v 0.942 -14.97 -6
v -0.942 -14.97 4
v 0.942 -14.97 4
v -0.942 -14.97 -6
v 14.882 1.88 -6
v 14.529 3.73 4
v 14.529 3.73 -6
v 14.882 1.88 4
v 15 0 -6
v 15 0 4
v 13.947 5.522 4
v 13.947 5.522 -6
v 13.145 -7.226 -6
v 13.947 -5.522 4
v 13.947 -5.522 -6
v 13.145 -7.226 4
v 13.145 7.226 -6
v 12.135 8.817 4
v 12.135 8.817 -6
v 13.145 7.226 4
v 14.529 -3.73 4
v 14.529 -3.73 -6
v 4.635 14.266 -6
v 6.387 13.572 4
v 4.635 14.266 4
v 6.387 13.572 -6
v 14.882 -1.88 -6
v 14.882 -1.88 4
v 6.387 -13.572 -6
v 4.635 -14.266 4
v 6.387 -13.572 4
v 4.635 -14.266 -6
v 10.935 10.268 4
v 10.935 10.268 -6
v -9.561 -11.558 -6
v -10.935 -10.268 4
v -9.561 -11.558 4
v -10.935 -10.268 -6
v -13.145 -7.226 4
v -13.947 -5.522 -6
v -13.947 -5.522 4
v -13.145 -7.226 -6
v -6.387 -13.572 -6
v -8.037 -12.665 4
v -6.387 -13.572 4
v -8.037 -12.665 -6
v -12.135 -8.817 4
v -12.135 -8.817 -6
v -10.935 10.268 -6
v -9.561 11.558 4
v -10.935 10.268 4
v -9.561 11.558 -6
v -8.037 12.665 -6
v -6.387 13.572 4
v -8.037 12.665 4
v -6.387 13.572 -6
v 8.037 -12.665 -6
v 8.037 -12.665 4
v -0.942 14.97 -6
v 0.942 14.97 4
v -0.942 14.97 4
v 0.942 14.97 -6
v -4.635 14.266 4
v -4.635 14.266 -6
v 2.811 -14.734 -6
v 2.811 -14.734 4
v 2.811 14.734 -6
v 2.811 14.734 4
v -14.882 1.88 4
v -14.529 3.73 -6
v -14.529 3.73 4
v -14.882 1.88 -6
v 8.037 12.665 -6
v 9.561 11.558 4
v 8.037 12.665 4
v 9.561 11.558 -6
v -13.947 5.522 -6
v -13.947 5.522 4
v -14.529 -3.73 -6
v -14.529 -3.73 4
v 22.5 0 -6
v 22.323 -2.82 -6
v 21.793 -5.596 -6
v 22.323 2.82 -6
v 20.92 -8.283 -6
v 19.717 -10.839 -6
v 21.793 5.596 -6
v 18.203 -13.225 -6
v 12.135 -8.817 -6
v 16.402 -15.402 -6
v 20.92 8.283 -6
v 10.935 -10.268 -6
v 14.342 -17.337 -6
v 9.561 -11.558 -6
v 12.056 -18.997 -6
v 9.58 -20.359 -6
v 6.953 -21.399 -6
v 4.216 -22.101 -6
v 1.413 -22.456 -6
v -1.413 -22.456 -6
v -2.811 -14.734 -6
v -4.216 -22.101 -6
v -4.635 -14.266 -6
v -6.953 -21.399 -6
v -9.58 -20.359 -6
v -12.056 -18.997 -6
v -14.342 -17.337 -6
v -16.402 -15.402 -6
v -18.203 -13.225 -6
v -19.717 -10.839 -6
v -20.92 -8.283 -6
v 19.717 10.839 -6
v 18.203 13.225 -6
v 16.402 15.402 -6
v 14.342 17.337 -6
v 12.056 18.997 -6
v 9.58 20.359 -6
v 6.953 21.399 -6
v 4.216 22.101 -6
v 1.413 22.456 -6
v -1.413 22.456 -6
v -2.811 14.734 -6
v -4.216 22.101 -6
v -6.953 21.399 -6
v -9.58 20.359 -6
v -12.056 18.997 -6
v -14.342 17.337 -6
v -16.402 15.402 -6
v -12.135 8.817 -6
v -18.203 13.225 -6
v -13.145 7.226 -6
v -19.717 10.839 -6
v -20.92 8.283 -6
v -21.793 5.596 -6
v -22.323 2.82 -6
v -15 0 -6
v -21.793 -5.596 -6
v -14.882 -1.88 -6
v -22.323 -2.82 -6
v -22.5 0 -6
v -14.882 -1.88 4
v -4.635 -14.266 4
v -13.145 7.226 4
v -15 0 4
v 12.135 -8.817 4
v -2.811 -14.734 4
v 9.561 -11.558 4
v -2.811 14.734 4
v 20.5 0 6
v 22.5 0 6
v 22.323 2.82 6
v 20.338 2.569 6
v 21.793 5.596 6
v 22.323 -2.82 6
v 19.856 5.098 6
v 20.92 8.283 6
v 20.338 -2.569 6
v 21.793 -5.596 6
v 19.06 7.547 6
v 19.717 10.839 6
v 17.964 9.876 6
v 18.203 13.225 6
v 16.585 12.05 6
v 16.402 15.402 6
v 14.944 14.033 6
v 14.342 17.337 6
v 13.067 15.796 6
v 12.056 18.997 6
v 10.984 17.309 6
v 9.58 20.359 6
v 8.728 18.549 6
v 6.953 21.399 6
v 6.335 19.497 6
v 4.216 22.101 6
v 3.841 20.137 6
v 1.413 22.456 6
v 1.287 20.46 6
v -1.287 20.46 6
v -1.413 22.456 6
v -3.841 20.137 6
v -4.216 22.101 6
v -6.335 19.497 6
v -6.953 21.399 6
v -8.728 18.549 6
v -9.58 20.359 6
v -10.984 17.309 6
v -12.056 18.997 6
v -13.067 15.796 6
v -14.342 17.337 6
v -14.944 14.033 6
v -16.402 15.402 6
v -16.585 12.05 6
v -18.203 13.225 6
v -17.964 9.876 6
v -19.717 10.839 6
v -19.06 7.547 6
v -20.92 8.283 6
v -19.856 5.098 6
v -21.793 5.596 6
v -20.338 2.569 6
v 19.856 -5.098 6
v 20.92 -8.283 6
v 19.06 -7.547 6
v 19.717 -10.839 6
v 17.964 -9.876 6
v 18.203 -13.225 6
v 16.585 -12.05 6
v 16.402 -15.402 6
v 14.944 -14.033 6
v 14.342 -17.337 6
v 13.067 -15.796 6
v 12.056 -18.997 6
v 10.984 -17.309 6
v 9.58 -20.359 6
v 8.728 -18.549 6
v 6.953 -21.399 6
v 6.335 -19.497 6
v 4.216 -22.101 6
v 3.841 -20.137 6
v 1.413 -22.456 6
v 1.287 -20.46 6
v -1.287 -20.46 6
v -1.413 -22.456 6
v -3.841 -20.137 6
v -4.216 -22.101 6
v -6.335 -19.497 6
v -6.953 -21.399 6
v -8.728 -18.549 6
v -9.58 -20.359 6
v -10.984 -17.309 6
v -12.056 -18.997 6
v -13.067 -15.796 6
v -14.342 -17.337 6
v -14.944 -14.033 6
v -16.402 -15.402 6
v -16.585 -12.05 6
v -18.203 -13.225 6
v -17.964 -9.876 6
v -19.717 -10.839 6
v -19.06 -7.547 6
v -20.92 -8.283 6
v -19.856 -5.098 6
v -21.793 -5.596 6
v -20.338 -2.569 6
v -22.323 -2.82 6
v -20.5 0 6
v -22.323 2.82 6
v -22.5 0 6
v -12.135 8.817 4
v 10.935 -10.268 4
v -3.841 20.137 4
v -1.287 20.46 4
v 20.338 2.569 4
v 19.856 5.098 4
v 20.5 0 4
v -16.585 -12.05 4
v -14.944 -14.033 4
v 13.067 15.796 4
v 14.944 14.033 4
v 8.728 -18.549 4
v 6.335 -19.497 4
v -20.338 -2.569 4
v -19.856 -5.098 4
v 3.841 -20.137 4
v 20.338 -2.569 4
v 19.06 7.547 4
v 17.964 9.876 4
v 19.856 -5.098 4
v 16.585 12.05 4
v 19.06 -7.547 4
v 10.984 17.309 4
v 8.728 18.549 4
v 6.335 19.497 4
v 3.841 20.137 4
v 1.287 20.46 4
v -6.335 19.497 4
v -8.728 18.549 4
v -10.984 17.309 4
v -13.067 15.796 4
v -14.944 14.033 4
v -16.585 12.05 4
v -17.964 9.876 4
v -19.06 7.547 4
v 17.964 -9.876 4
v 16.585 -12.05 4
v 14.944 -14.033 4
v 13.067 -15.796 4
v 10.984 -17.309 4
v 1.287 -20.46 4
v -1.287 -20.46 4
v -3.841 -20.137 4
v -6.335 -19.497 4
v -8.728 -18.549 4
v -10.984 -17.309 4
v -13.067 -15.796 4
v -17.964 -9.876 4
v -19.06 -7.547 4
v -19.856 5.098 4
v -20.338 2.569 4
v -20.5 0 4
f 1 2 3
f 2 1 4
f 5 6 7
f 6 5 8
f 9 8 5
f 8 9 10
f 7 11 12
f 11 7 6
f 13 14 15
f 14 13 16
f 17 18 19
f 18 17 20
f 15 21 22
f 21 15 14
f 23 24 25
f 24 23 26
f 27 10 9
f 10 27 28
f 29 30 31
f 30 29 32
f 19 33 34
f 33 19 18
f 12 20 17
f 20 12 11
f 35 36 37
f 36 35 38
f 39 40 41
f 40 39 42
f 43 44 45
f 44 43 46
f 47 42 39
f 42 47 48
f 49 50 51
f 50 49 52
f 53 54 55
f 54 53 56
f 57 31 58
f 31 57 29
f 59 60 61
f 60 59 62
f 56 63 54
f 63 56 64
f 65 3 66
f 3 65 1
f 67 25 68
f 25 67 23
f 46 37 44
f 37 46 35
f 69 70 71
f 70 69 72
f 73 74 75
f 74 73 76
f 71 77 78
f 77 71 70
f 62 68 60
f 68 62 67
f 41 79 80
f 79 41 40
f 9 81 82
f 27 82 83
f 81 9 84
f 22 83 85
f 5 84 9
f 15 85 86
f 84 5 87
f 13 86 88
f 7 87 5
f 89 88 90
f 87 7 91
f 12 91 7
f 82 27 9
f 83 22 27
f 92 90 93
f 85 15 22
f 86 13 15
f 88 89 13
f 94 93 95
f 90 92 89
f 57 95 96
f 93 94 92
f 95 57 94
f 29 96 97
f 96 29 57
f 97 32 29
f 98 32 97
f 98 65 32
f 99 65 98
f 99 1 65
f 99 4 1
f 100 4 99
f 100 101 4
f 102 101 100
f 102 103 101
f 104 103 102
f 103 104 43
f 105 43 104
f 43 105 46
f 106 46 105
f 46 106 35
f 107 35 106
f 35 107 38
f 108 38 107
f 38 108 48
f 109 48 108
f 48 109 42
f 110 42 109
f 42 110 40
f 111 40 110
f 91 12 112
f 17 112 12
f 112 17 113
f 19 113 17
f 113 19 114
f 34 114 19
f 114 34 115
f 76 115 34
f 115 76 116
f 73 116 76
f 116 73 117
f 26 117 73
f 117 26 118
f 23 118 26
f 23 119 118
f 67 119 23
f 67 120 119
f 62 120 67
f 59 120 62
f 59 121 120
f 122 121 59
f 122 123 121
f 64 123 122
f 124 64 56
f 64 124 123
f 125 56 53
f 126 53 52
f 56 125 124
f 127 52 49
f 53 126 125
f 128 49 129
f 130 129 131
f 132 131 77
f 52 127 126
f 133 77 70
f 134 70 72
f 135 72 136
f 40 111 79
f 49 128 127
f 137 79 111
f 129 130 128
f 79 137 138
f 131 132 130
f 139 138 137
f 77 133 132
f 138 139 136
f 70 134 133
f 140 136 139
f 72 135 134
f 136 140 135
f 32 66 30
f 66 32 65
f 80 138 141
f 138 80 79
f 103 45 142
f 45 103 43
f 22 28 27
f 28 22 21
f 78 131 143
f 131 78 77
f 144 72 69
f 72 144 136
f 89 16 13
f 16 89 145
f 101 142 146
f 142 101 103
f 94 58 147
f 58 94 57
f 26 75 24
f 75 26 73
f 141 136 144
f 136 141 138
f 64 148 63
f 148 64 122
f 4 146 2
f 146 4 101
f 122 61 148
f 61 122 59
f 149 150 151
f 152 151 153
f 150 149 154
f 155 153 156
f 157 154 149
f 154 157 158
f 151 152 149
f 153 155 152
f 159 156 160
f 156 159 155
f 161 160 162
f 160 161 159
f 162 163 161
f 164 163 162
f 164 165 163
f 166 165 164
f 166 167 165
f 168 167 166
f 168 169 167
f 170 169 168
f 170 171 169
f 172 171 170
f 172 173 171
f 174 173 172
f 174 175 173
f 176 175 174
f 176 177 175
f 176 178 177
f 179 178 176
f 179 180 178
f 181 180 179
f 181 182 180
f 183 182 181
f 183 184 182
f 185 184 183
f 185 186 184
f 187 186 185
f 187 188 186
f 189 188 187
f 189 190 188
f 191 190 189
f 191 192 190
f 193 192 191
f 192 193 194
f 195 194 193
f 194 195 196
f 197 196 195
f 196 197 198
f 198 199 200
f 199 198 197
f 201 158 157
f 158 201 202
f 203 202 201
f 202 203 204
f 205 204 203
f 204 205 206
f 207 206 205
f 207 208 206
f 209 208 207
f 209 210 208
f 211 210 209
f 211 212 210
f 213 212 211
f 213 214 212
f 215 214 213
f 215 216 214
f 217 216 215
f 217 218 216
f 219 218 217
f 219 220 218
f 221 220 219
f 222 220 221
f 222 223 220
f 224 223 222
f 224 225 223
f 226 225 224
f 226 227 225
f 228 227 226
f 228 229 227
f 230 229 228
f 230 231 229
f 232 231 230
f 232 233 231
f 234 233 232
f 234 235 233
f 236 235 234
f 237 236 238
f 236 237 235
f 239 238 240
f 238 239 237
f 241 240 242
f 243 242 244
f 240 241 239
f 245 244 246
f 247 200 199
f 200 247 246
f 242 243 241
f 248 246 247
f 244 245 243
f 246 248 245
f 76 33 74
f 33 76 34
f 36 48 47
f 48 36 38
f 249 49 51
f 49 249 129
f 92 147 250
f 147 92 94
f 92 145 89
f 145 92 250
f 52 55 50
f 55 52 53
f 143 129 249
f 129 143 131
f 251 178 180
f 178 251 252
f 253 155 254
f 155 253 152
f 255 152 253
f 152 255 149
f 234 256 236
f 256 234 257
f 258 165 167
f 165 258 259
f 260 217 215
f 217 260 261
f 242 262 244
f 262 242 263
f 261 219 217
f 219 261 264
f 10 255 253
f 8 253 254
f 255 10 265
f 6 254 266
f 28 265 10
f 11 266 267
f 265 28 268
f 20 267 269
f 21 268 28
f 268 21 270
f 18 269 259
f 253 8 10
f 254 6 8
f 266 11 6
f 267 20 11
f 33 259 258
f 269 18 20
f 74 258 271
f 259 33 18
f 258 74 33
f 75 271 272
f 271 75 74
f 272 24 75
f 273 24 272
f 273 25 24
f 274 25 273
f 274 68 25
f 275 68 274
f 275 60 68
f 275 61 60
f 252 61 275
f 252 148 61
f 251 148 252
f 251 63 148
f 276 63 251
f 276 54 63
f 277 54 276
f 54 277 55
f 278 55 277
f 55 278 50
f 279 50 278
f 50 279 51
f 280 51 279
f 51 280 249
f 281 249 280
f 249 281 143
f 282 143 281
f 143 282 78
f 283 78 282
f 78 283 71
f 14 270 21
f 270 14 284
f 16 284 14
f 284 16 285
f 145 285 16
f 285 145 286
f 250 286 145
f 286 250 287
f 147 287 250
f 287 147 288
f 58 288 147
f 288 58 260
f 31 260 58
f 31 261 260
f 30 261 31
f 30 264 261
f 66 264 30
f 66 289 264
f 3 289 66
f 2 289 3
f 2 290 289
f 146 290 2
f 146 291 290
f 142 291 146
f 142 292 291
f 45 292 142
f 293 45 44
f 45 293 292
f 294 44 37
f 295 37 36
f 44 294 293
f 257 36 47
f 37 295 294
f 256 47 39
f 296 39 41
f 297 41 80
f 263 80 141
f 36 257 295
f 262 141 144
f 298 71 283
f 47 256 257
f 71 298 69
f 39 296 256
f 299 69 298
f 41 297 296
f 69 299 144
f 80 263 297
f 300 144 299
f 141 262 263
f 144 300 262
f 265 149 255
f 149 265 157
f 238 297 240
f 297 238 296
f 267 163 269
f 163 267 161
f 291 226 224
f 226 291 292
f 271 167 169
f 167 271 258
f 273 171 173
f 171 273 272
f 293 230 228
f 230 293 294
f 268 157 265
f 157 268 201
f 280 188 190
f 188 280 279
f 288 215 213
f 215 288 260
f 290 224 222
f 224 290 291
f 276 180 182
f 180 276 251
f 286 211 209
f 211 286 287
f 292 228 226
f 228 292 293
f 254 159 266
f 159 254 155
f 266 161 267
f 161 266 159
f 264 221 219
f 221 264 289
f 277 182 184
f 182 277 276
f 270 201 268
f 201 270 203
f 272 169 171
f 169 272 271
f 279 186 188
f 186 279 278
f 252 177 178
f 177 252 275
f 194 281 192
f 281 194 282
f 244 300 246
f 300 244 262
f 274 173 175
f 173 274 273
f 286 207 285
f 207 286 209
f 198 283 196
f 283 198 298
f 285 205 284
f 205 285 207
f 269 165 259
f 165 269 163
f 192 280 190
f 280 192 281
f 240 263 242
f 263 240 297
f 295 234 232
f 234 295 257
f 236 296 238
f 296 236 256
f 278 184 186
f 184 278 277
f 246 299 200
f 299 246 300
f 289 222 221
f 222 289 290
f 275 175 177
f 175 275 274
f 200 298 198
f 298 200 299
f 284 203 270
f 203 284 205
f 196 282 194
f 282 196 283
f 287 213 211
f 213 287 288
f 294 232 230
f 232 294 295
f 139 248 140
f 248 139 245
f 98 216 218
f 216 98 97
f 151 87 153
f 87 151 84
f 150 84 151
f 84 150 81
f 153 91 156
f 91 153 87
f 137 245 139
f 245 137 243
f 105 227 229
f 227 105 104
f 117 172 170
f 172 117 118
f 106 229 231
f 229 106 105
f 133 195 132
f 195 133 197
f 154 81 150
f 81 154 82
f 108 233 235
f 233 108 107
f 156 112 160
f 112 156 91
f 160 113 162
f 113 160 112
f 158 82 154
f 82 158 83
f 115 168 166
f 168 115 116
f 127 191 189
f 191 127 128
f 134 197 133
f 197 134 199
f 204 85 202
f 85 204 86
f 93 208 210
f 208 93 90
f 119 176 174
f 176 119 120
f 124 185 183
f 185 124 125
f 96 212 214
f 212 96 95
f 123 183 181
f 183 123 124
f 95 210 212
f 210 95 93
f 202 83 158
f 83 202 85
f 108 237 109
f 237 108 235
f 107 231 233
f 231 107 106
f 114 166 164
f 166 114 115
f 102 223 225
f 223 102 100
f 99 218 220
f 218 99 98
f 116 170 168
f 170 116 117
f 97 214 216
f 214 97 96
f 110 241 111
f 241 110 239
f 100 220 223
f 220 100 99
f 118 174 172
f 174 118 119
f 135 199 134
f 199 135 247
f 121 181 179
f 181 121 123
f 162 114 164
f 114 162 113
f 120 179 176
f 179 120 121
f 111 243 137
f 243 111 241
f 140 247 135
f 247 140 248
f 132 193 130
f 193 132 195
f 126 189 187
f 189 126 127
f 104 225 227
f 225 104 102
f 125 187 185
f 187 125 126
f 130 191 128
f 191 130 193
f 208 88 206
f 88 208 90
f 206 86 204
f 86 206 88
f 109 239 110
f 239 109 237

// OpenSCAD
$fn = 50;


difference() {
	union() {
		translate(v = [0, 0, -6.0000000000]) {
			cylinder(h = 12, r = 22.5000000000);
		}
	}
	union() {
		#translate(v = [0, 0, -6.0000000000]) {
			cylinder(h = 12, r = 15.0000000000);
		}
		translate(v = [0, 0, 4.0000000000]) {
			cylinder(h = 2, r = 20.5000000000);
		}
	}
}
